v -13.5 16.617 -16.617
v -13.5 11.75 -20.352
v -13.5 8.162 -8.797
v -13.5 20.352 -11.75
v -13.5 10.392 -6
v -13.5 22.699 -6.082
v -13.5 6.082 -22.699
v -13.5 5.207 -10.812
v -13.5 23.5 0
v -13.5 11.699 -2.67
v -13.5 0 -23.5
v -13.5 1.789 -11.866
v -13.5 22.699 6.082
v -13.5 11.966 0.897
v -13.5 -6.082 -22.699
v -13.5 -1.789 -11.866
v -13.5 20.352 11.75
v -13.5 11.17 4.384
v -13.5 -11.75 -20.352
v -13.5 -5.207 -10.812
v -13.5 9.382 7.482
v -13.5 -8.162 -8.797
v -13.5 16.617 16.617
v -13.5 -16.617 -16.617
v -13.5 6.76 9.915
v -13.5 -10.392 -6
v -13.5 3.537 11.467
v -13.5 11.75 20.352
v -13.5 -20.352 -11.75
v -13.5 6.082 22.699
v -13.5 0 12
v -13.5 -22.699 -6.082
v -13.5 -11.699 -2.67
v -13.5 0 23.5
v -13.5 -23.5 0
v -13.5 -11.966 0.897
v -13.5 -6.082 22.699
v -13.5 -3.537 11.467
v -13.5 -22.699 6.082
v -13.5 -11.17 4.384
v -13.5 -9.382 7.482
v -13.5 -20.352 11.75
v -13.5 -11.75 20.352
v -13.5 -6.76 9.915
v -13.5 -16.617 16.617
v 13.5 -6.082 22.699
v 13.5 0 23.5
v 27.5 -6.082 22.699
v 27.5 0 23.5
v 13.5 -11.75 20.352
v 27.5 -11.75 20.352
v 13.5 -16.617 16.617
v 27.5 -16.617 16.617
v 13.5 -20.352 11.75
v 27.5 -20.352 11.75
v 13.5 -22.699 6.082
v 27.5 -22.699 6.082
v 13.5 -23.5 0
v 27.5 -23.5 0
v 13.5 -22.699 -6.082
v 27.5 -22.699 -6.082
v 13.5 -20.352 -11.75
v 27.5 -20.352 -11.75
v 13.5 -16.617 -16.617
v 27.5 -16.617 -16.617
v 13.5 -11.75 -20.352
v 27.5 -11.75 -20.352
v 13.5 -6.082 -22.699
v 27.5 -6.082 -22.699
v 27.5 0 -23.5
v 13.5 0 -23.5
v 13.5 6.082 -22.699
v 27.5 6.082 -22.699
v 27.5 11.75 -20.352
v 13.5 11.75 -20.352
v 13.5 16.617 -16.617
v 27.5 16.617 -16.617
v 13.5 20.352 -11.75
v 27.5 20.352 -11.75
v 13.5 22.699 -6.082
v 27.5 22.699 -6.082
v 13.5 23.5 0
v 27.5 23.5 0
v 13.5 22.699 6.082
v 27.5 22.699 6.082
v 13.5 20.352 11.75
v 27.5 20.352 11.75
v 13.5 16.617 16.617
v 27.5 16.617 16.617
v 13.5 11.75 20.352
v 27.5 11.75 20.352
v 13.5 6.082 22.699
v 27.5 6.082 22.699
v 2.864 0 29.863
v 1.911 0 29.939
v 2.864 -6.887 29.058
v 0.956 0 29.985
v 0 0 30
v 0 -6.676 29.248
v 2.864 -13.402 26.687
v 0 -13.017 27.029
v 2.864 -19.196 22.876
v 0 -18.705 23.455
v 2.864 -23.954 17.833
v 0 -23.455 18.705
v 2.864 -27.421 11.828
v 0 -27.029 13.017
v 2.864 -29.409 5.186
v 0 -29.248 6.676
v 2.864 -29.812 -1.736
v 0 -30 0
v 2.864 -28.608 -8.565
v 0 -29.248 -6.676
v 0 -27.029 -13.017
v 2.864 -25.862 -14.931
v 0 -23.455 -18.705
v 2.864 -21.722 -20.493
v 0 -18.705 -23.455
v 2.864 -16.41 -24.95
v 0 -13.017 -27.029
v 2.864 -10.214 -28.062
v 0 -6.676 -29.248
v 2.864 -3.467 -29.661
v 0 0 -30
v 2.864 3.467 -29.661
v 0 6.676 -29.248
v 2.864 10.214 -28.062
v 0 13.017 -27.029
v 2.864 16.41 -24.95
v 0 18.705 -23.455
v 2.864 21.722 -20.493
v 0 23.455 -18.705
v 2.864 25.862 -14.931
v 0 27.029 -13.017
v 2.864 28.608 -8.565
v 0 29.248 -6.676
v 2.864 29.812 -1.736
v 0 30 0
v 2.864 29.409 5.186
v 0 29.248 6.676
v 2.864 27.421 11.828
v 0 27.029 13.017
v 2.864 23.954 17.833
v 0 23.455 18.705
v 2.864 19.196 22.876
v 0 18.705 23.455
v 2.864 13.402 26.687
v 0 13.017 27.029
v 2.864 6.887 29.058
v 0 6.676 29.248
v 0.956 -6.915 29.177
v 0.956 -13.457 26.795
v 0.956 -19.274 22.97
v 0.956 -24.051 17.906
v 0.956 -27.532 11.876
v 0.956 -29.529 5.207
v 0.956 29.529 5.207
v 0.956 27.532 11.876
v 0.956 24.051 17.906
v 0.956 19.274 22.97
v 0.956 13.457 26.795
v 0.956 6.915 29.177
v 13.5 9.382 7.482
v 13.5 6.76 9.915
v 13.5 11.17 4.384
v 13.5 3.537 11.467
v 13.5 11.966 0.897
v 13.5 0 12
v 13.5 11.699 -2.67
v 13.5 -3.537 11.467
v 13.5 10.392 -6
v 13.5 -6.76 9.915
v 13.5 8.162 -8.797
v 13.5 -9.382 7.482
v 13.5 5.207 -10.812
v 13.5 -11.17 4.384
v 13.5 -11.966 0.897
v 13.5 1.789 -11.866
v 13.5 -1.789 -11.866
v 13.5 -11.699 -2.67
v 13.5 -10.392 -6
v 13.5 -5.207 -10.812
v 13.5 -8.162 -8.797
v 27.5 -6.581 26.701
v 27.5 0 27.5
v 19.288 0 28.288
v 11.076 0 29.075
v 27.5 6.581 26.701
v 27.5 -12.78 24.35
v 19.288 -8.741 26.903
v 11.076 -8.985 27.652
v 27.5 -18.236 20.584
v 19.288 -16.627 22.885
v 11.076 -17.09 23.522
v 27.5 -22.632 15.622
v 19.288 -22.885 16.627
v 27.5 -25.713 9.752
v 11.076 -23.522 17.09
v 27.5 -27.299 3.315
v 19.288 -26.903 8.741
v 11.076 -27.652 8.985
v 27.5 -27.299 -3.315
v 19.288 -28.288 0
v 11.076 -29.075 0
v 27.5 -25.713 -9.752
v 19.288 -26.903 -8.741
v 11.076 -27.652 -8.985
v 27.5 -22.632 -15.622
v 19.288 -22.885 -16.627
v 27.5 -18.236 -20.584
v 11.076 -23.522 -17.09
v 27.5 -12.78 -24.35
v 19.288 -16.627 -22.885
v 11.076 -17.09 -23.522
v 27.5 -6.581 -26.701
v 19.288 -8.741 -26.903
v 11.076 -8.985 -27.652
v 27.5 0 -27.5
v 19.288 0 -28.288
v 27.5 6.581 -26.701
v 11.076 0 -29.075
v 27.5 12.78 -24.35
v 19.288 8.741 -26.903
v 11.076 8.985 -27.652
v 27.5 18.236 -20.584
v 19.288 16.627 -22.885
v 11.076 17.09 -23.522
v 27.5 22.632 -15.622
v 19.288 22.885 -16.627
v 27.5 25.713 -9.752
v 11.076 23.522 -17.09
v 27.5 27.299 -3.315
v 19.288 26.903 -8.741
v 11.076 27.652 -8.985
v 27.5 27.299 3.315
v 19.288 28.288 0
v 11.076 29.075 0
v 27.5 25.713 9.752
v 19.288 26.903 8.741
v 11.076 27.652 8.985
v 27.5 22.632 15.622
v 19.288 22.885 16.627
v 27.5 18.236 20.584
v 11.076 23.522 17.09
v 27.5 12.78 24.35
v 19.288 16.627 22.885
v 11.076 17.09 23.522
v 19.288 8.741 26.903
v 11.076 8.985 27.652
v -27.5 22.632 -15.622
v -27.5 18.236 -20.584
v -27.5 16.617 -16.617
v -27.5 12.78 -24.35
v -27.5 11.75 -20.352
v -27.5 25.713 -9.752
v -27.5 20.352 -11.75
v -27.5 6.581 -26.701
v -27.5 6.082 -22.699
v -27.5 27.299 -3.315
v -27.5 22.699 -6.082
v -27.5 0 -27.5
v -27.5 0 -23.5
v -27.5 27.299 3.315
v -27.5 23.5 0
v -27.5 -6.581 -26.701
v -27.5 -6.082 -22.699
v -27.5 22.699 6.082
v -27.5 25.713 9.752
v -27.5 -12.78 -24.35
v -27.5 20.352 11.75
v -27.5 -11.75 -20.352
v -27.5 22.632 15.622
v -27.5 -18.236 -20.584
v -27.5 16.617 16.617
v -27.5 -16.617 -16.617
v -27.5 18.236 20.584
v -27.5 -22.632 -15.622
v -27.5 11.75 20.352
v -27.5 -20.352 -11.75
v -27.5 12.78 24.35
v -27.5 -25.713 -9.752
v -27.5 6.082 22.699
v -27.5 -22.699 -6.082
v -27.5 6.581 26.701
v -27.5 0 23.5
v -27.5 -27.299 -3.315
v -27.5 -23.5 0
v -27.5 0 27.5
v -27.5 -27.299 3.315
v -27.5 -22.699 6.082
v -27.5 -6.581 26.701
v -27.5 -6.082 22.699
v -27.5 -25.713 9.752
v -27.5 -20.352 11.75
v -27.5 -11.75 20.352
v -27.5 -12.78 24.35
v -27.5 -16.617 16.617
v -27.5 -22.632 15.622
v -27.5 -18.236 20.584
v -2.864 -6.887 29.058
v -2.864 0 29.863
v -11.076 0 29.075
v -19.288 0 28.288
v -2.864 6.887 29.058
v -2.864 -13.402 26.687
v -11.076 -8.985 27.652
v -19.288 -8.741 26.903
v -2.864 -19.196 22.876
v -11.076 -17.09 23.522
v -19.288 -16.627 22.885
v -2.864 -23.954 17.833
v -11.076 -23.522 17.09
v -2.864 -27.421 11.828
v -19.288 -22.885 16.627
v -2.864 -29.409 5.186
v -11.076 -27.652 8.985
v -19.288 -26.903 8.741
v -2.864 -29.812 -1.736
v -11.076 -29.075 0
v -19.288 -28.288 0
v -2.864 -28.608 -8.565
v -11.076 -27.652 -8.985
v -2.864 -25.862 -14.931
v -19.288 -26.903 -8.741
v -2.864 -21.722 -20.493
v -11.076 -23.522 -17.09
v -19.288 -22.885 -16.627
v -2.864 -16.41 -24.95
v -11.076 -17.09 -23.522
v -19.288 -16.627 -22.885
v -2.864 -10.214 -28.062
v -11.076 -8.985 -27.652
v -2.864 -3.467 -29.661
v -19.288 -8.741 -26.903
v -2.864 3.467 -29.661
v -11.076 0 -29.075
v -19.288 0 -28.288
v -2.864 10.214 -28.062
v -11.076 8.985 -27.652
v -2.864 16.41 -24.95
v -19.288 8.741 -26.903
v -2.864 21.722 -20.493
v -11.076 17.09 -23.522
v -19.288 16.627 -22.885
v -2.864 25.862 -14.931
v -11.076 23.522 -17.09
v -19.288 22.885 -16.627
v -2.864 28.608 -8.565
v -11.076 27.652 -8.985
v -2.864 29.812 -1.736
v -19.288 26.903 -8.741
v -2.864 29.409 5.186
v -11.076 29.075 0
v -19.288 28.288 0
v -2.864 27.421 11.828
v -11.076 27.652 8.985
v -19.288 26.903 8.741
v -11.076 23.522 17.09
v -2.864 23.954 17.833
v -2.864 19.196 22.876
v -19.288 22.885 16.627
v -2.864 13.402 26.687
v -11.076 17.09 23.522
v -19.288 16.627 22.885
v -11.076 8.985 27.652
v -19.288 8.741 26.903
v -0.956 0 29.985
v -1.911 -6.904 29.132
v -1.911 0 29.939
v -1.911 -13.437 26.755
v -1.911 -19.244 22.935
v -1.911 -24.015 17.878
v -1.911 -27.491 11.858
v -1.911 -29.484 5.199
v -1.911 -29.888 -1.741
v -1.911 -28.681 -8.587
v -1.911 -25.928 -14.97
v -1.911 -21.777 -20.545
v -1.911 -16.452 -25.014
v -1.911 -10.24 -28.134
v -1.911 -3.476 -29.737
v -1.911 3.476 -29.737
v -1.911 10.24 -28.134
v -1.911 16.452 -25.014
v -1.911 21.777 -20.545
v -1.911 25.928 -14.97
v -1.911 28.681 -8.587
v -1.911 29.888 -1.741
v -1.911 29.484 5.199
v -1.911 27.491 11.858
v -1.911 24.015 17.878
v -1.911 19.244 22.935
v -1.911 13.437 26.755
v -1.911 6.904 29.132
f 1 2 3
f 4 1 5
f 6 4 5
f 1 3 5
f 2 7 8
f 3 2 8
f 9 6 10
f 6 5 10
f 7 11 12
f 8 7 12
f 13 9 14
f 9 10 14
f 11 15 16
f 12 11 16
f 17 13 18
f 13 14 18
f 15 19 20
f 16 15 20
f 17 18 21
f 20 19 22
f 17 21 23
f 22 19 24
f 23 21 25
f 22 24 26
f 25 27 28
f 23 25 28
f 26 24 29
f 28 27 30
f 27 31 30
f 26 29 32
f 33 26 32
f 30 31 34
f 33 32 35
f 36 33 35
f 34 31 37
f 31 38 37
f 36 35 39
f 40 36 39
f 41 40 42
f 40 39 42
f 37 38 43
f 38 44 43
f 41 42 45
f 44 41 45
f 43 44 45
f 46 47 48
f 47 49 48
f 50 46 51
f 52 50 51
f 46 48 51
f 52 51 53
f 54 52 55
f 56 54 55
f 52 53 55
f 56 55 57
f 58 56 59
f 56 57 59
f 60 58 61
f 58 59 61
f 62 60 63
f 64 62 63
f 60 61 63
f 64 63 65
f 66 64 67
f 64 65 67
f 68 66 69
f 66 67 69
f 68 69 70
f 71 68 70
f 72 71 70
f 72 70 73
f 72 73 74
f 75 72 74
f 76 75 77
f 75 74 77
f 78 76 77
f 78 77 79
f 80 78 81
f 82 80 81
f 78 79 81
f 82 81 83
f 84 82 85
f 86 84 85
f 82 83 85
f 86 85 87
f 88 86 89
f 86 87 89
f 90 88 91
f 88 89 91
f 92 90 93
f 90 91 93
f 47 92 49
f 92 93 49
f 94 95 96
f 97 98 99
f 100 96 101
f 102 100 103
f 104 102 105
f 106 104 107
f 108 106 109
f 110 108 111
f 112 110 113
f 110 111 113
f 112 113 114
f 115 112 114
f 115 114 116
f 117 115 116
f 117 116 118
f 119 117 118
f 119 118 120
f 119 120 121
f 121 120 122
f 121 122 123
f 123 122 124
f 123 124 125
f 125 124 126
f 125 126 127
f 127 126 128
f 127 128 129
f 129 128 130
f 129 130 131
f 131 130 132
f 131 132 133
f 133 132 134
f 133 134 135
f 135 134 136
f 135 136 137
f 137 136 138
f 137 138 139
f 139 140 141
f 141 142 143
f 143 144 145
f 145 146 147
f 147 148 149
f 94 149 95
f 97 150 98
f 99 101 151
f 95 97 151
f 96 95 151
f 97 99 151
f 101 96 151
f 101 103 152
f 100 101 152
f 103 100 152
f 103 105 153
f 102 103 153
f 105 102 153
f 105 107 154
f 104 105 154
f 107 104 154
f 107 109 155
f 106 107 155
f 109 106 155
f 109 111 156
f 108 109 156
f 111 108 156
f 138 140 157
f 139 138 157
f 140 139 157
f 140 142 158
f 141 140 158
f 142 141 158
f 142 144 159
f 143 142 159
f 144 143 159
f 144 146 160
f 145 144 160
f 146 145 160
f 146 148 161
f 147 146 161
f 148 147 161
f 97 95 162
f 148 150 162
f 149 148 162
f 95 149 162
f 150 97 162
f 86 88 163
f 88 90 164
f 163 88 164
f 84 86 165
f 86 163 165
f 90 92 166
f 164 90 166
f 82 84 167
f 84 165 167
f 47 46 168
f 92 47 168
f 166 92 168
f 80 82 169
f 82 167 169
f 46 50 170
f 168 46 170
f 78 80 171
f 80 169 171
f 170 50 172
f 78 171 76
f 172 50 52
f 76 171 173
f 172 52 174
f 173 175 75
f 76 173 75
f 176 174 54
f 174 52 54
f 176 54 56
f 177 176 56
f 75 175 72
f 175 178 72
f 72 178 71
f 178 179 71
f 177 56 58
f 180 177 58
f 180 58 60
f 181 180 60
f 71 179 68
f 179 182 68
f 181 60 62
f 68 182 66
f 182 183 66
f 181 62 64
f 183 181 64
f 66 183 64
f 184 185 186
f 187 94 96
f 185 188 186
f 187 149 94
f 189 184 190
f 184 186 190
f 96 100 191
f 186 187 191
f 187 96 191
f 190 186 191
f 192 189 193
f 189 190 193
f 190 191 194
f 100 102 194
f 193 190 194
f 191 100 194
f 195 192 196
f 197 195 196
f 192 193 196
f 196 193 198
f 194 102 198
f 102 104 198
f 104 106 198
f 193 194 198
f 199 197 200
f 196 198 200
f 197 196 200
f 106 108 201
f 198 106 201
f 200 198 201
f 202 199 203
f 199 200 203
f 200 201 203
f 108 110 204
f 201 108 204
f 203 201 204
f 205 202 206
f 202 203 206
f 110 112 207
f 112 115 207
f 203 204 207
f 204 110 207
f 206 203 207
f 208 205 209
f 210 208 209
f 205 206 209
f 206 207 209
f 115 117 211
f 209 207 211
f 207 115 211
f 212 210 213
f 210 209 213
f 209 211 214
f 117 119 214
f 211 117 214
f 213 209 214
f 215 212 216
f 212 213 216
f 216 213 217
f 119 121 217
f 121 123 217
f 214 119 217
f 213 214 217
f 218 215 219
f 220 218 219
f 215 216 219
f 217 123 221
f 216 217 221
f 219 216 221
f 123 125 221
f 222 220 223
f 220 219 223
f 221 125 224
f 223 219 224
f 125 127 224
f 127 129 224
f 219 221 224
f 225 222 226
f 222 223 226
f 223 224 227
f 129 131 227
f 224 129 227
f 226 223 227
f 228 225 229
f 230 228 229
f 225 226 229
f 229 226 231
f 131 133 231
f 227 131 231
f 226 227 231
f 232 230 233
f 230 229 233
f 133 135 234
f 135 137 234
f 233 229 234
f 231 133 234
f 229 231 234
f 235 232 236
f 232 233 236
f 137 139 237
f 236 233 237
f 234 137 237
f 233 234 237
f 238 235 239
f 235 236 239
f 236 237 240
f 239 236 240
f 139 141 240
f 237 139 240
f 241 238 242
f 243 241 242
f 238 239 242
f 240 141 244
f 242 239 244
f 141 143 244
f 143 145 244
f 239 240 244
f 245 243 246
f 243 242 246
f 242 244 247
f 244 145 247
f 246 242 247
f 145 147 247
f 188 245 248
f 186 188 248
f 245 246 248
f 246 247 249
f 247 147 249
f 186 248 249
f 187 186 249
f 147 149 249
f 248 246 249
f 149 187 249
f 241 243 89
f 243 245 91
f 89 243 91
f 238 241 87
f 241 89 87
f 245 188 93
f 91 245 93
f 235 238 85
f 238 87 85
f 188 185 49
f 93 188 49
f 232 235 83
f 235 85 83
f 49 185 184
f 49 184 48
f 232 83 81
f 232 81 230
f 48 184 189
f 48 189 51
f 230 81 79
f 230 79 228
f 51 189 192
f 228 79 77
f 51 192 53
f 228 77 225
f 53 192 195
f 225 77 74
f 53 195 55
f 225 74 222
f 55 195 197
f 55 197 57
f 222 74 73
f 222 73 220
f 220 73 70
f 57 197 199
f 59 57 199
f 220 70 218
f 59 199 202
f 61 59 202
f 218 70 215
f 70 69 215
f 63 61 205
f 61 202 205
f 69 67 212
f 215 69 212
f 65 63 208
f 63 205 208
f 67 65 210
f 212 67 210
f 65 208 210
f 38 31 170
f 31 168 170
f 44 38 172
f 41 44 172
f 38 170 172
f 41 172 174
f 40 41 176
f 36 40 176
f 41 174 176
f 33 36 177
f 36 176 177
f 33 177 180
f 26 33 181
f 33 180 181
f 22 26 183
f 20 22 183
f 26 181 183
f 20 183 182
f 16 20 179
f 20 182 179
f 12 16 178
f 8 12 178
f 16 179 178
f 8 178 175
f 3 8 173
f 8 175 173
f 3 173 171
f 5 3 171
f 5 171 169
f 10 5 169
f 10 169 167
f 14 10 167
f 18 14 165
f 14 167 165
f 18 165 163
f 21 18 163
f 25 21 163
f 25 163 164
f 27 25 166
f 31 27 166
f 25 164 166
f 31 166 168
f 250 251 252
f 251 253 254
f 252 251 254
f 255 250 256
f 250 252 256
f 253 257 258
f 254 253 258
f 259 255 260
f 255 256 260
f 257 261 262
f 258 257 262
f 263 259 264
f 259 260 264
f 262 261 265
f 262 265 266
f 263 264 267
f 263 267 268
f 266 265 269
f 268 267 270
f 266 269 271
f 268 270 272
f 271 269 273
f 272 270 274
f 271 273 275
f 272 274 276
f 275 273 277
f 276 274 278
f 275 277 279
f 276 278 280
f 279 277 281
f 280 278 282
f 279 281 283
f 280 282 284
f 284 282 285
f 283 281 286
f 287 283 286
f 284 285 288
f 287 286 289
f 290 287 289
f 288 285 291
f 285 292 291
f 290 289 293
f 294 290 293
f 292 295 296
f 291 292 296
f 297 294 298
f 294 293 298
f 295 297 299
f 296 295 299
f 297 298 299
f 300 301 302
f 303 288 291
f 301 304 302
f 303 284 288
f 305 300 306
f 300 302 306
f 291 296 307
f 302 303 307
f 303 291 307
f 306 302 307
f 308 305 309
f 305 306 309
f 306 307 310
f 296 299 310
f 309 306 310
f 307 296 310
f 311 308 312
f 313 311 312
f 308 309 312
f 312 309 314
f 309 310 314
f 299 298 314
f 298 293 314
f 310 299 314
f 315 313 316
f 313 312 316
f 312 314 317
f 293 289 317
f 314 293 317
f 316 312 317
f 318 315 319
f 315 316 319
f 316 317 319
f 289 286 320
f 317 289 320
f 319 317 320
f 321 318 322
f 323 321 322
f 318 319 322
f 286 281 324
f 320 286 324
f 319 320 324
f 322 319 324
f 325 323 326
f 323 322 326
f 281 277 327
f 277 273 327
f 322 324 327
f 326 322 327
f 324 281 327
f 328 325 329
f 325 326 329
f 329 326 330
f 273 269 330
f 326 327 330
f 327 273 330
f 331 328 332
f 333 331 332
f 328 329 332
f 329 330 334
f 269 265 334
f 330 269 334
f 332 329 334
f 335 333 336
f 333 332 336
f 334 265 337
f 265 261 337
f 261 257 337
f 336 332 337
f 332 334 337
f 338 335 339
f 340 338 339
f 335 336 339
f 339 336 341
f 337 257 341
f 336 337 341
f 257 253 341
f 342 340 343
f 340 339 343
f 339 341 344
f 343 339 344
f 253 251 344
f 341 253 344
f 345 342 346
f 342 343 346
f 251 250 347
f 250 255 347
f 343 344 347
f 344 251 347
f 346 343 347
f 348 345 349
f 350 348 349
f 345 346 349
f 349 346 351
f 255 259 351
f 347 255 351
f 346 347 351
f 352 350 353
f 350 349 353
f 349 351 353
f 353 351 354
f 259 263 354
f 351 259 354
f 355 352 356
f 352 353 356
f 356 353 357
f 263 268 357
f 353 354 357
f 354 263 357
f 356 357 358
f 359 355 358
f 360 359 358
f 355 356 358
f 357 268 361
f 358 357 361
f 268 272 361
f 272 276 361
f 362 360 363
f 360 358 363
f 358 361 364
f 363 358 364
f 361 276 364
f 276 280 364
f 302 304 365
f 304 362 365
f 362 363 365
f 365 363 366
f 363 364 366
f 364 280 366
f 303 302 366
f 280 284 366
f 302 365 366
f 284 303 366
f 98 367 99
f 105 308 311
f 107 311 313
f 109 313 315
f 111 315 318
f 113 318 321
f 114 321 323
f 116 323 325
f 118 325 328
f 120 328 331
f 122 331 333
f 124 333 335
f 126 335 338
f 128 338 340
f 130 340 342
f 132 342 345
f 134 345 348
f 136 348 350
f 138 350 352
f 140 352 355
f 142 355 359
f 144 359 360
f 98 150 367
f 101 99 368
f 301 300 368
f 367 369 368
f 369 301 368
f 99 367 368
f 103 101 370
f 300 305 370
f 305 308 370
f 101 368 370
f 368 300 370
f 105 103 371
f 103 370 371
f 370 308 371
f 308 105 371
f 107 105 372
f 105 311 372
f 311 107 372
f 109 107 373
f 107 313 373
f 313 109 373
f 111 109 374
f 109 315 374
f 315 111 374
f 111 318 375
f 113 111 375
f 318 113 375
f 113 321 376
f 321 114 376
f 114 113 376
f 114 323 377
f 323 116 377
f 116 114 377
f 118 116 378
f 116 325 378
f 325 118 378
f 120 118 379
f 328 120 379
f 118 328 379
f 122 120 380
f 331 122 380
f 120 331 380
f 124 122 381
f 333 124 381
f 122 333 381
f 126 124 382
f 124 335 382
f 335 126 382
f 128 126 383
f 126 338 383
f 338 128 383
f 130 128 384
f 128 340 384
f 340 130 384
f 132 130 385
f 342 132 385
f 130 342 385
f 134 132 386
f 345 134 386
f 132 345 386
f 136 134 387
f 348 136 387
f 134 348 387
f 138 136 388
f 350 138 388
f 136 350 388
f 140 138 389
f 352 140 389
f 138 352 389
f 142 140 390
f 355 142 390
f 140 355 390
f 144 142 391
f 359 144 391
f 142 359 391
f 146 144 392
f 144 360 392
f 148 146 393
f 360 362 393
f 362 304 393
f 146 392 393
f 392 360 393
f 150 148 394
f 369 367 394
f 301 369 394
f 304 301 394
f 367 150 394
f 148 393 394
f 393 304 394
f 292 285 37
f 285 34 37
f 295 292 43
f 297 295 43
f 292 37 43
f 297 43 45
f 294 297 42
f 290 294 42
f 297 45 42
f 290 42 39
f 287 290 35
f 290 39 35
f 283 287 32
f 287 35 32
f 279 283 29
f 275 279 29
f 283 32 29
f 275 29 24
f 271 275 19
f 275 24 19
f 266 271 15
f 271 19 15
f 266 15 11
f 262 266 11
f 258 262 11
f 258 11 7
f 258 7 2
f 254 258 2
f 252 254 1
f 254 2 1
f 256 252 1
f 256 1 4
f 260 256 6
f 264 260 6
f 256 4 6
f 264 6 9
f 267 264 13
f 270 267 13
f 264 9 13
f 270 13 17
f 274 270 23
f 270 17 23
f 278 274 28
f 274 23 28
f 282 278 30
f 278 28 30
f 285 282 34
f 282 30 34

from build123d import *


with BuildPart() as f1:
    # F0 (on Front) → F1 (revolve)
    with BuildSketch(Plane.XZ):
        with BuildLine():
            Line((27.5, 23.5), (27.5, 27.5))
            Line((27.5, 27.5), (2.864325, 29.862948))
            ThreePointArc((2.864325, 29.862948), (1.433801, 29.965717), (0, 30))
            ThreePointArc((0, 30), (-1.433801, 29.965717), (-2.864325, 29.862948))
            Line((-2.864325, 29.862948), (-27.5, 27.5))
            Line((-27.5, 27.5), (-27.5, 23.5))
            Line((-27.5, 23.5), (-13.5, 23.5))
            Line((-13.5, 23.5), (-13.5, 12))
            Line((-13.5, 12), (0, 12))
            Line((0, 12), (13.5, 12))
            Line((13.5, 12), (13.5, 23.5))
            Line((13.5, 23.5), (27.5, 23.5))
        make_face()
    revolve(axis=Axis((13.75, 0, 0), (1, 0, 0)))


solid = f1.part
